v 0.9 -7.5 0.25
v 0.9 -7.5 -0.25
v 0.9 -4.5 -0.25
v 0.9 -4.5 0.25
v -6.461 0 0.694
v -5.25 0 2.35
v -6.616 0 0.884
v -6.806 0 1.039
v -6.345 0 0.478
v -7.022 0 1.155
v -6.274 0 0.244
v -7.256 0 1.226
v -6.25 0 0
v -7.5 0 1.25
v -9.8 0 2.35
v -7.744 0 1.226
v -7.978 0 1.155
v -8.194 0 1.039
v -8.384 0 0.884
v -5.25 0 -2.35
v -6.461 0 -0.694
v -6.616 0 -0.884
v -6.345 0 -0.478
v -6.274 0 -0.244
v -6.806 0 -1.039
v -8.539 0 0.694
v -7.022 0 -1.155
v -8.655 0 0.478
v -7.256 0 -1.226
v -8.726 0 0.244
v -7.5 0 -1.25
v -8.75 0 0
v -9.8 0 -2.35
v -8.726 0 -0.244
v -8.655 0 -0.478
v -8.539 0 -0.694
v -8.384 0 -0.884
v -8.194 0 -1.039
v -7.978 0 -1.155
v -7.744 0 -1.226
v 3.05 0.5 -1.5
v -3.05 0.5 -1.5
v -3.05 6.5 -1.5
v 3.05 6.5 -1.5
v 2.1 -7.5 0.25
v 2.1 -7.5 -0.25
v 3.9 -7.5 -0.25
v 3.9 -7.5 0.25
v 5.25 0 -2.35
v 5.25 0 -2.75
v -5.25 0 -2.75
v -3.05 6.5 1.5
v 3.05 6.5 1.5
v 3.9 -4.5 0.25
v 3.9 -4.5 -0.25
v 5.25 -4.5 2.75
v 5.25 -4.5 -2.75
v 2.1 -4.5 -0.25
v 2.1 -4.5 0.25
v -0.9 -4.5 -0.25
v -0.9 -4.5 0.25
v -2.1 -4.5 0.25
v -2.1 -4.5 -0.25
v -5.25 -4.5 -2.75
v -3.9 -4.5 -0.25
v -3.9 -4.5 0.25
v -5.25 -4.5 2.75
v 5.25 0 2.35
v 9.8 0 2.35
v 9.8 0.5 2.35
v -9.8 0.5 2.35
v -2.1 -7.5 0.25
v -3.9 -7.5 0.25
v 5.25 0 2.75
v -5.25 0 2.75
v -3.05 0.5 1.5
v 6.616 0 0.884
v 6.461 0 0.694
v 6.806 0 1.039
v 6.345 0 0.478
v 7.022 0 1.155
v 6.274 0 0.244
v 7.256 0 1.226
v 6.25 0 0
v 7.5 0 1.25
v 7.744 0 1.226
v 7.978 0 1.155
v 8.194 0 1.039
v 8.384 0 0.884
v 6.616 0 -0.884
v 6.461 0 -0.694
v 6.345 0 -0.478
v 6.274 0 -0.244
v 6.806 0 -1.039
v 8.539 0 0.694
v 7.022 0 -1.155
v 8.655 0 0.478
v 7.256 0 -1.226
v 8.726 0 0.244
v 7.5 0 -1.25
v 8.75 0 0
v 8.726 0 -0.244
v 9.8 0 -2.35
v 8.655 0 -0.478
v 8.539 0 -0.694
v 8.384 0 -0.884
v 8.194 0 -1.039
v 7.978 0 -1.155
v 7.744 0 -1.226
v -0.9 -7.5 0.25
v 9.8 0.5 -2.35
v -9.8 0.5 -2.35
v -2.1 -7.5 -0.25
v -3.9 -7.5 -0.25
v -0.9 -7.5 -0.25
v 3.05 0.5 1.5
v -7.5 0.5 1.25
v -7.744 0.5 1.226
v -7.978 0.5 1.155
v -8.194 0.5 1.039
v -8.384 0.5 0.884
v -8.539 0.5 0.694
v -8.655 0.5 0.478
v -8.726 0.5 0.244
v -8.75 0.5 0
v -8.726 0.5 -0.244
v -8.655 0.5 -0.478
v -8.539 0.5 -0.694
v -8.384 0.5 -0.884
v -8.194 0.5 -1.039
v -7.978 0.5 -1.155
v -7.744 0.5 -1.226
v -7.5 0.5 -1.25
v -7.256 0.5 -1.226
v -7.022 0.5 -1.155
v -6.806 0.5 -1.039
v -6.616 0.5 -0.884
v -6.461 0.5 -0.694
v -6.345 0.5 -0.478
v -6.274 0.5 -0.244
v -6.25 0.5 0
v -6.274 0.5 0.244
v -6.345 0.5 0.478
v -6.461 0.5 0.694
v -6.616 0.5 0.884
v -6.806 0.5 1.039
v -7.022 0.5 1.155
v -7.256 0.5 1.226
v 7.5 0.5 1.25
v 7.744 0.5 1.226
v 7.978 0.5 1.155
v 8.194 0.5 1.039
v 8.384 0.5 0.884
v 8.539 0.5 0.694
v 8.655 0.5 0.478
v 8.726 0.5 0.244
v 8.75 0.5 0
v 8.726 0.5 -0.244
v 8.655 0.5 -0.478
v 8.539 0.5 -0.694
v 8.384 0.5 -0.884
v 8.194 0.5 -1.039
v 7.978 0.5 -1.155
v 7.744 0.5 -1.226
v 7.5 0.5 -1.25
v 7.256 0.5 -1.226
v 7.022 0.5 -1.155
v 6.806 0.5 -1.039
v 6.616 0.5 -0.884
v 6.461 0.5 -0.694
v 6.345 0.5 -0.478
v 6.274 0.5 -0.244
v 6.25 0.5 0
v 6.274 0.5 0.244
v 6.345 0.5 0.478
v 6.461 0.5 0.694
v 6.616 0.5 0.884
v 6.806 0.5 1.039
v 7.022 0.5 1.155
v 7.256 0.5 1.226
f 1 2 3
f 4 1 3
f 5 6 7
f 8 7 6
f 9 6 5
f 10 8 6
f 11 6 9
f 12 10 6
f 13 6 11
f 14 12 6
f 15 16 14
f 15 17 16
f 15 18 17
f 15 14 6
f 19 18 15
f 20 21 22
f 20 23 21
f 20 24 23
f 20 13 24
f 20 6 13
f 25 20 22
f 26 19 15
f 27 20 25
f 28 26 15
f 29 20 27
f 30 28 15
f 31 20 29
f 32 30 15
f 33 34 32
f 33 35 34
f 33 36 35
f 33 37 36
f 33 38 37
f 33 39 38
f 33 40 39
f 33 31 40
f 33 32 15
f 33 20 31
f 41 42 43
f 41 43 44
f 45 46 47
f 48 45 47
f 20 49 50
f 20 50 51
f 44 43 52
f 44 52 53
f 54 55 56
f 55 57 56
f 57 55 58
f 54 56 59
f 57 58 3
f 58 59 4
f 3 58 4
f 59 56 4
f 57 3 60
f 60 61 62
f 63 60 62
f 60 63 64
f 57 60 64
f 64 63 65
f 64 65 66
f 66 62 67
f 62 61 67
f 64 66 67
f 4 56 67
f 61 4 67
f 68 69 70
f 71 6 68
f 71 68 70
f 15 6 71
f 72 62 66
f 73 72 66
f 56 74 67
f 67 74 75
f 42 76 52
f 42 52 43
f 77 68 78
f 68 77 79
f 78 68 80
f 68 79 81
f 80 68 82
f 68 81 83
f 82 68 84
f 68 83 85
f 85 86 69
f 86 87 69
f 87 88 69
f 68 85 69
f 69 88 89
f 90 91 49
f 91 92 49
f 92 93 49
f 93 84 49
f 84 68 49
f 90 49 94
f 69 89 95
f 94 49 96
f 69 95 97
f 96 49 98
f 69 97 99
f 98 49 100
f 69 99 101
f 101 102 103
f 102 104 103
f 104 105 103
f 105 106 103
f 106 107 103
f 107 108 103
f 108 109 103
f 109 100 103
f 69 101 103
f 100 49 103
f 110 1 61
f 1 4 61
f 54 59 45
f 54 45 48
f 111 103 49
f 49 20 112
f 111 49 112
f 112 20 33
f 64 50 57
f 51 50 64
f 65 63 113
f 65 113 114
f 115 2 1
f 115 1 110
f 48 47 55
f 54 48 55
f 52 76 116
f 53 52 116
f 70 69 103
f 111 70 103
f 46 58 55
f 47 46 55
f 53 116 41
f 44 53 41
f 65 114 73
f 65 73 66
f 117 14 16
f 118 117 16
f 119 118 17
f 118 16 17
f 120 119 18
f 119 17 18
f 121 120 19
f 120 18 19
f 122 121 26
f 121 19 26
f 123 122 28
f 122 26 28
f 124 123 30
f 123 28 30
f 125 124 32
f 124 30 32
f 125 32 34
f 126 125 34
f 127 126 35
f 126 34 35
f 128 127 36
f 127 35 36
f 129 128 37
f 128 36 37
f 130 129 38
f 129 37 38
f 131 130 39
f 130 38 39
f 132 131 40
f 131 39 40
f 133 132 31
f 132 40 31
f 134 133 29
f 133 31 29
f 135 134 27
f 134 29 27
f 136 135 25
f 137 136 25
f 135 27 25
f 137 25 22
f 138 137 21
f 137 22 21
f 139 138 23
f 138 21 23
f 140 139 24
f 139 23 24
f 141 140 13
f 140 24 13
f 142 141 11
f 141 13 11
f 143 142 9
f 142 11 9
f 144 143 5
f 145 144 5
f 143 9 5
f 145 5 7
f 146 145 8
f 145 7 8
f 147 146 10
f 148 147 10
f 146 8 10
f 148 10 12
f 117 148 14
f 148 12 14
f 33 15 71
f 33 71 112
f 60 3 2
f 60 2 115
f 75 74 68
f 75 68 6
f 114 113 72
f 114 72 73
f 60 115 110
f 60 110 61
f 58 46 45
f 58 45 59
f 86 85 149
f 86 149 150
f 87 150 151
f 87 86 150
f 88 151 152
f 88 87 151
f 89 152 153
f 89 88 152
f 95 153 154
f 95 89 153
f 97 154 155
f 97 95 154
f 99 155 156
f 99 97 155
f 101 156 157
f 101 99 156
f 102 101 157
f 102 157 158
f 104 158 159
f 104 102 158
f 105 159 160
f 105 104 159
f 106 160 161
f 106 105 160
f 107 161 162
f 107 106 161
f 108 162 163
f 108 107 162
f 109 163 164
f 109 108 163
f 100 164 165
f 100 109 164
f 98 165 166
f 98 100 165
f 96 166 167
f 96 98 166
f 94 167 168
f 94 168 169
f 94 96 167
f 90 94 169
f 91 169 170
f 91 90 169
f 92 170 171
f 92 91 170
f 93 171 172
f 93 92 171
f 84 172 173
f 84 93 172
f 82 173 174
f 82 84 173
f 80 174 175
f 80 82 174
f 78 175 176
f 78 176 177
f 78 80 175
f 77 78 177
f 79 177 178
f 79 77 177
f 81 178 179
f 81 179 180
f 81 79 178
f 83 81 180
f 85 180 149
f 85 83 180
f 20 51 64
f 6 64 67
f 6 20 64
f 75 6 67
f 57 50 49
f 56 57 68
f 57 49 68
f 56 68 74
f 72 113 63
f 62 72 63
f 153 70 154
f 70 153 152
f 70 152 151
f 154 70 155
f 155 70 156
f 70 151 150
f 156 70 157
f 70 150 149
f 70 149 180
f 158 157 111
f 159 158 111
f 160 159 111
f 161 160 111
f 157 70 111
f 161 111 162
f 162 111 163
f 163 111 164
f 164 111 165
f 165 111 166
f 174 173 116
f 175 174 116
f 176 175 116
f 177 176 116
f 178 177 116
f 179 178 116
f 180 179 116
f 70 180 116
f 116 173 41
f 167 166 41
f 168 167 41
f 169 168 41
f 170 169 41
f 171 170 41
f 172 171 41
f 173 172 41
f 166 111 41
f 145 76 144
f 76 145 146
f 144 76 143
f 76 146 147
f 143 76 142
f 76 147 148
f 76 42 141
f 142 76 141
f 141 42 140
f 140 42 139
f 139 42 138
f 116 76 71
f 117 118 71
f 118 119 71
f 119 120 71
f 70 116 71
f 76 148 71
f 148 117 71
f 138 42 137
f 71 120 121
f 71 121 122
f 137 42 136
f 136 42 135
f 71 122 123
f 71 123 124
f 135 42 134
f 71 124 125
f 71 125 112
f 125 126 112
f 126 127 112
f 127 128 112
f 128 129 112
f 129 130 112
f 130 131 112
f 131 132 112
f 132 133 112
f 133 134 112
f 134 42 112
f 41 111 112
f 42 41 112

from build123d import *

# Parameters (mm, degrees)
SKETCH_1_W           = 9.8
SKETCH_1_H           = 4.7
SKETCH_1_R           = 1.25
EXTRUDE_1_DEPTH      = 0.5
SKETCH_2_W           = 5.25
SKETCH_2_H           = 5.5
EXTRUDE_2_DEPTH      = 4.5
EXTRUDE_3_DEPTH      = 0.25
EXTRUDE_3_DEPTH_BACK = 0.25
SKETCH_3_W           = 1.8
SKETCH_3_H           = 3
SKETCH_3_W_2         = 0.9
SKETCH_4_W           = 6.1
SKETCH_4_H           = 3
EXTRUDE_4_DEPTH      = 6


with BuildPart() as part:
    # 草图1 → 凸台-拉伸1 (new body)
    with BuildSketch(Plane(origin=(0, 0, 0), x_dir=(1, 0, 0), z_dir=(0, 1, 0))):
        with Locations((4.9, 0)):
            Rectangle(SKETCH_1_W, SKETCH_1_H)
        with Locations(Location((7.5, 0, 0), (0, 0, 270))):
            Circle(SKETCH_1_R, mode=Mode.SUBTRACT)
    extrude(amount=EXTRUDE_1_DEPTH)

    # 草图2 → 凸台-拉伸2 (add)
    with BuildSketch(Plane.XZ):
        with Locations((2.625, 0)):
            Rectangle(SKETCH_2_W, SKETCH_2_H)
    extrude(amount=EXTRUDE_2_DEPTH)

    # 草图3 → 凸台-拉伸3 (add, two sides: drawn at the far end of the back side and taken through both)
    with BuildSketch(Plane.XY.offset(-EXTRUDE_3_DEPTH_BACK)):
        with Locations((3, -6)):
            Rectangle(SKETCH_3_W, SKETCH_3_H)
        with Locations((0.45, -6)):
            Rectangle(SKETCH_3_W_2, SKETCH_3_H)
    extrude(amount=EXTRUDE_3_DEPTH + EXTRUDE_3_DEPTH_BACK)

    # 镜向1: part across plane


with BuildPart() as part_1:
    add(part.part)
    add(part.part.mirror(Plane(origin=(0, 0.5, -2.35), x_dir=(0, 0, 1), z_dir=(1, 0, 0))))

    # 草图4 → 凸台-拉伸4 (add)
    with BuildSketch(Plane(origin=(0, 0.5, 0), x_dir=(1, 0, 0), z_dir=(0, 1, 0))):
        Rectangle(SKETCH_4_W, SKETCH_4_H)
    extrude(amount=EXTRUDE_4_DEPTH)


solid = part_1.part
